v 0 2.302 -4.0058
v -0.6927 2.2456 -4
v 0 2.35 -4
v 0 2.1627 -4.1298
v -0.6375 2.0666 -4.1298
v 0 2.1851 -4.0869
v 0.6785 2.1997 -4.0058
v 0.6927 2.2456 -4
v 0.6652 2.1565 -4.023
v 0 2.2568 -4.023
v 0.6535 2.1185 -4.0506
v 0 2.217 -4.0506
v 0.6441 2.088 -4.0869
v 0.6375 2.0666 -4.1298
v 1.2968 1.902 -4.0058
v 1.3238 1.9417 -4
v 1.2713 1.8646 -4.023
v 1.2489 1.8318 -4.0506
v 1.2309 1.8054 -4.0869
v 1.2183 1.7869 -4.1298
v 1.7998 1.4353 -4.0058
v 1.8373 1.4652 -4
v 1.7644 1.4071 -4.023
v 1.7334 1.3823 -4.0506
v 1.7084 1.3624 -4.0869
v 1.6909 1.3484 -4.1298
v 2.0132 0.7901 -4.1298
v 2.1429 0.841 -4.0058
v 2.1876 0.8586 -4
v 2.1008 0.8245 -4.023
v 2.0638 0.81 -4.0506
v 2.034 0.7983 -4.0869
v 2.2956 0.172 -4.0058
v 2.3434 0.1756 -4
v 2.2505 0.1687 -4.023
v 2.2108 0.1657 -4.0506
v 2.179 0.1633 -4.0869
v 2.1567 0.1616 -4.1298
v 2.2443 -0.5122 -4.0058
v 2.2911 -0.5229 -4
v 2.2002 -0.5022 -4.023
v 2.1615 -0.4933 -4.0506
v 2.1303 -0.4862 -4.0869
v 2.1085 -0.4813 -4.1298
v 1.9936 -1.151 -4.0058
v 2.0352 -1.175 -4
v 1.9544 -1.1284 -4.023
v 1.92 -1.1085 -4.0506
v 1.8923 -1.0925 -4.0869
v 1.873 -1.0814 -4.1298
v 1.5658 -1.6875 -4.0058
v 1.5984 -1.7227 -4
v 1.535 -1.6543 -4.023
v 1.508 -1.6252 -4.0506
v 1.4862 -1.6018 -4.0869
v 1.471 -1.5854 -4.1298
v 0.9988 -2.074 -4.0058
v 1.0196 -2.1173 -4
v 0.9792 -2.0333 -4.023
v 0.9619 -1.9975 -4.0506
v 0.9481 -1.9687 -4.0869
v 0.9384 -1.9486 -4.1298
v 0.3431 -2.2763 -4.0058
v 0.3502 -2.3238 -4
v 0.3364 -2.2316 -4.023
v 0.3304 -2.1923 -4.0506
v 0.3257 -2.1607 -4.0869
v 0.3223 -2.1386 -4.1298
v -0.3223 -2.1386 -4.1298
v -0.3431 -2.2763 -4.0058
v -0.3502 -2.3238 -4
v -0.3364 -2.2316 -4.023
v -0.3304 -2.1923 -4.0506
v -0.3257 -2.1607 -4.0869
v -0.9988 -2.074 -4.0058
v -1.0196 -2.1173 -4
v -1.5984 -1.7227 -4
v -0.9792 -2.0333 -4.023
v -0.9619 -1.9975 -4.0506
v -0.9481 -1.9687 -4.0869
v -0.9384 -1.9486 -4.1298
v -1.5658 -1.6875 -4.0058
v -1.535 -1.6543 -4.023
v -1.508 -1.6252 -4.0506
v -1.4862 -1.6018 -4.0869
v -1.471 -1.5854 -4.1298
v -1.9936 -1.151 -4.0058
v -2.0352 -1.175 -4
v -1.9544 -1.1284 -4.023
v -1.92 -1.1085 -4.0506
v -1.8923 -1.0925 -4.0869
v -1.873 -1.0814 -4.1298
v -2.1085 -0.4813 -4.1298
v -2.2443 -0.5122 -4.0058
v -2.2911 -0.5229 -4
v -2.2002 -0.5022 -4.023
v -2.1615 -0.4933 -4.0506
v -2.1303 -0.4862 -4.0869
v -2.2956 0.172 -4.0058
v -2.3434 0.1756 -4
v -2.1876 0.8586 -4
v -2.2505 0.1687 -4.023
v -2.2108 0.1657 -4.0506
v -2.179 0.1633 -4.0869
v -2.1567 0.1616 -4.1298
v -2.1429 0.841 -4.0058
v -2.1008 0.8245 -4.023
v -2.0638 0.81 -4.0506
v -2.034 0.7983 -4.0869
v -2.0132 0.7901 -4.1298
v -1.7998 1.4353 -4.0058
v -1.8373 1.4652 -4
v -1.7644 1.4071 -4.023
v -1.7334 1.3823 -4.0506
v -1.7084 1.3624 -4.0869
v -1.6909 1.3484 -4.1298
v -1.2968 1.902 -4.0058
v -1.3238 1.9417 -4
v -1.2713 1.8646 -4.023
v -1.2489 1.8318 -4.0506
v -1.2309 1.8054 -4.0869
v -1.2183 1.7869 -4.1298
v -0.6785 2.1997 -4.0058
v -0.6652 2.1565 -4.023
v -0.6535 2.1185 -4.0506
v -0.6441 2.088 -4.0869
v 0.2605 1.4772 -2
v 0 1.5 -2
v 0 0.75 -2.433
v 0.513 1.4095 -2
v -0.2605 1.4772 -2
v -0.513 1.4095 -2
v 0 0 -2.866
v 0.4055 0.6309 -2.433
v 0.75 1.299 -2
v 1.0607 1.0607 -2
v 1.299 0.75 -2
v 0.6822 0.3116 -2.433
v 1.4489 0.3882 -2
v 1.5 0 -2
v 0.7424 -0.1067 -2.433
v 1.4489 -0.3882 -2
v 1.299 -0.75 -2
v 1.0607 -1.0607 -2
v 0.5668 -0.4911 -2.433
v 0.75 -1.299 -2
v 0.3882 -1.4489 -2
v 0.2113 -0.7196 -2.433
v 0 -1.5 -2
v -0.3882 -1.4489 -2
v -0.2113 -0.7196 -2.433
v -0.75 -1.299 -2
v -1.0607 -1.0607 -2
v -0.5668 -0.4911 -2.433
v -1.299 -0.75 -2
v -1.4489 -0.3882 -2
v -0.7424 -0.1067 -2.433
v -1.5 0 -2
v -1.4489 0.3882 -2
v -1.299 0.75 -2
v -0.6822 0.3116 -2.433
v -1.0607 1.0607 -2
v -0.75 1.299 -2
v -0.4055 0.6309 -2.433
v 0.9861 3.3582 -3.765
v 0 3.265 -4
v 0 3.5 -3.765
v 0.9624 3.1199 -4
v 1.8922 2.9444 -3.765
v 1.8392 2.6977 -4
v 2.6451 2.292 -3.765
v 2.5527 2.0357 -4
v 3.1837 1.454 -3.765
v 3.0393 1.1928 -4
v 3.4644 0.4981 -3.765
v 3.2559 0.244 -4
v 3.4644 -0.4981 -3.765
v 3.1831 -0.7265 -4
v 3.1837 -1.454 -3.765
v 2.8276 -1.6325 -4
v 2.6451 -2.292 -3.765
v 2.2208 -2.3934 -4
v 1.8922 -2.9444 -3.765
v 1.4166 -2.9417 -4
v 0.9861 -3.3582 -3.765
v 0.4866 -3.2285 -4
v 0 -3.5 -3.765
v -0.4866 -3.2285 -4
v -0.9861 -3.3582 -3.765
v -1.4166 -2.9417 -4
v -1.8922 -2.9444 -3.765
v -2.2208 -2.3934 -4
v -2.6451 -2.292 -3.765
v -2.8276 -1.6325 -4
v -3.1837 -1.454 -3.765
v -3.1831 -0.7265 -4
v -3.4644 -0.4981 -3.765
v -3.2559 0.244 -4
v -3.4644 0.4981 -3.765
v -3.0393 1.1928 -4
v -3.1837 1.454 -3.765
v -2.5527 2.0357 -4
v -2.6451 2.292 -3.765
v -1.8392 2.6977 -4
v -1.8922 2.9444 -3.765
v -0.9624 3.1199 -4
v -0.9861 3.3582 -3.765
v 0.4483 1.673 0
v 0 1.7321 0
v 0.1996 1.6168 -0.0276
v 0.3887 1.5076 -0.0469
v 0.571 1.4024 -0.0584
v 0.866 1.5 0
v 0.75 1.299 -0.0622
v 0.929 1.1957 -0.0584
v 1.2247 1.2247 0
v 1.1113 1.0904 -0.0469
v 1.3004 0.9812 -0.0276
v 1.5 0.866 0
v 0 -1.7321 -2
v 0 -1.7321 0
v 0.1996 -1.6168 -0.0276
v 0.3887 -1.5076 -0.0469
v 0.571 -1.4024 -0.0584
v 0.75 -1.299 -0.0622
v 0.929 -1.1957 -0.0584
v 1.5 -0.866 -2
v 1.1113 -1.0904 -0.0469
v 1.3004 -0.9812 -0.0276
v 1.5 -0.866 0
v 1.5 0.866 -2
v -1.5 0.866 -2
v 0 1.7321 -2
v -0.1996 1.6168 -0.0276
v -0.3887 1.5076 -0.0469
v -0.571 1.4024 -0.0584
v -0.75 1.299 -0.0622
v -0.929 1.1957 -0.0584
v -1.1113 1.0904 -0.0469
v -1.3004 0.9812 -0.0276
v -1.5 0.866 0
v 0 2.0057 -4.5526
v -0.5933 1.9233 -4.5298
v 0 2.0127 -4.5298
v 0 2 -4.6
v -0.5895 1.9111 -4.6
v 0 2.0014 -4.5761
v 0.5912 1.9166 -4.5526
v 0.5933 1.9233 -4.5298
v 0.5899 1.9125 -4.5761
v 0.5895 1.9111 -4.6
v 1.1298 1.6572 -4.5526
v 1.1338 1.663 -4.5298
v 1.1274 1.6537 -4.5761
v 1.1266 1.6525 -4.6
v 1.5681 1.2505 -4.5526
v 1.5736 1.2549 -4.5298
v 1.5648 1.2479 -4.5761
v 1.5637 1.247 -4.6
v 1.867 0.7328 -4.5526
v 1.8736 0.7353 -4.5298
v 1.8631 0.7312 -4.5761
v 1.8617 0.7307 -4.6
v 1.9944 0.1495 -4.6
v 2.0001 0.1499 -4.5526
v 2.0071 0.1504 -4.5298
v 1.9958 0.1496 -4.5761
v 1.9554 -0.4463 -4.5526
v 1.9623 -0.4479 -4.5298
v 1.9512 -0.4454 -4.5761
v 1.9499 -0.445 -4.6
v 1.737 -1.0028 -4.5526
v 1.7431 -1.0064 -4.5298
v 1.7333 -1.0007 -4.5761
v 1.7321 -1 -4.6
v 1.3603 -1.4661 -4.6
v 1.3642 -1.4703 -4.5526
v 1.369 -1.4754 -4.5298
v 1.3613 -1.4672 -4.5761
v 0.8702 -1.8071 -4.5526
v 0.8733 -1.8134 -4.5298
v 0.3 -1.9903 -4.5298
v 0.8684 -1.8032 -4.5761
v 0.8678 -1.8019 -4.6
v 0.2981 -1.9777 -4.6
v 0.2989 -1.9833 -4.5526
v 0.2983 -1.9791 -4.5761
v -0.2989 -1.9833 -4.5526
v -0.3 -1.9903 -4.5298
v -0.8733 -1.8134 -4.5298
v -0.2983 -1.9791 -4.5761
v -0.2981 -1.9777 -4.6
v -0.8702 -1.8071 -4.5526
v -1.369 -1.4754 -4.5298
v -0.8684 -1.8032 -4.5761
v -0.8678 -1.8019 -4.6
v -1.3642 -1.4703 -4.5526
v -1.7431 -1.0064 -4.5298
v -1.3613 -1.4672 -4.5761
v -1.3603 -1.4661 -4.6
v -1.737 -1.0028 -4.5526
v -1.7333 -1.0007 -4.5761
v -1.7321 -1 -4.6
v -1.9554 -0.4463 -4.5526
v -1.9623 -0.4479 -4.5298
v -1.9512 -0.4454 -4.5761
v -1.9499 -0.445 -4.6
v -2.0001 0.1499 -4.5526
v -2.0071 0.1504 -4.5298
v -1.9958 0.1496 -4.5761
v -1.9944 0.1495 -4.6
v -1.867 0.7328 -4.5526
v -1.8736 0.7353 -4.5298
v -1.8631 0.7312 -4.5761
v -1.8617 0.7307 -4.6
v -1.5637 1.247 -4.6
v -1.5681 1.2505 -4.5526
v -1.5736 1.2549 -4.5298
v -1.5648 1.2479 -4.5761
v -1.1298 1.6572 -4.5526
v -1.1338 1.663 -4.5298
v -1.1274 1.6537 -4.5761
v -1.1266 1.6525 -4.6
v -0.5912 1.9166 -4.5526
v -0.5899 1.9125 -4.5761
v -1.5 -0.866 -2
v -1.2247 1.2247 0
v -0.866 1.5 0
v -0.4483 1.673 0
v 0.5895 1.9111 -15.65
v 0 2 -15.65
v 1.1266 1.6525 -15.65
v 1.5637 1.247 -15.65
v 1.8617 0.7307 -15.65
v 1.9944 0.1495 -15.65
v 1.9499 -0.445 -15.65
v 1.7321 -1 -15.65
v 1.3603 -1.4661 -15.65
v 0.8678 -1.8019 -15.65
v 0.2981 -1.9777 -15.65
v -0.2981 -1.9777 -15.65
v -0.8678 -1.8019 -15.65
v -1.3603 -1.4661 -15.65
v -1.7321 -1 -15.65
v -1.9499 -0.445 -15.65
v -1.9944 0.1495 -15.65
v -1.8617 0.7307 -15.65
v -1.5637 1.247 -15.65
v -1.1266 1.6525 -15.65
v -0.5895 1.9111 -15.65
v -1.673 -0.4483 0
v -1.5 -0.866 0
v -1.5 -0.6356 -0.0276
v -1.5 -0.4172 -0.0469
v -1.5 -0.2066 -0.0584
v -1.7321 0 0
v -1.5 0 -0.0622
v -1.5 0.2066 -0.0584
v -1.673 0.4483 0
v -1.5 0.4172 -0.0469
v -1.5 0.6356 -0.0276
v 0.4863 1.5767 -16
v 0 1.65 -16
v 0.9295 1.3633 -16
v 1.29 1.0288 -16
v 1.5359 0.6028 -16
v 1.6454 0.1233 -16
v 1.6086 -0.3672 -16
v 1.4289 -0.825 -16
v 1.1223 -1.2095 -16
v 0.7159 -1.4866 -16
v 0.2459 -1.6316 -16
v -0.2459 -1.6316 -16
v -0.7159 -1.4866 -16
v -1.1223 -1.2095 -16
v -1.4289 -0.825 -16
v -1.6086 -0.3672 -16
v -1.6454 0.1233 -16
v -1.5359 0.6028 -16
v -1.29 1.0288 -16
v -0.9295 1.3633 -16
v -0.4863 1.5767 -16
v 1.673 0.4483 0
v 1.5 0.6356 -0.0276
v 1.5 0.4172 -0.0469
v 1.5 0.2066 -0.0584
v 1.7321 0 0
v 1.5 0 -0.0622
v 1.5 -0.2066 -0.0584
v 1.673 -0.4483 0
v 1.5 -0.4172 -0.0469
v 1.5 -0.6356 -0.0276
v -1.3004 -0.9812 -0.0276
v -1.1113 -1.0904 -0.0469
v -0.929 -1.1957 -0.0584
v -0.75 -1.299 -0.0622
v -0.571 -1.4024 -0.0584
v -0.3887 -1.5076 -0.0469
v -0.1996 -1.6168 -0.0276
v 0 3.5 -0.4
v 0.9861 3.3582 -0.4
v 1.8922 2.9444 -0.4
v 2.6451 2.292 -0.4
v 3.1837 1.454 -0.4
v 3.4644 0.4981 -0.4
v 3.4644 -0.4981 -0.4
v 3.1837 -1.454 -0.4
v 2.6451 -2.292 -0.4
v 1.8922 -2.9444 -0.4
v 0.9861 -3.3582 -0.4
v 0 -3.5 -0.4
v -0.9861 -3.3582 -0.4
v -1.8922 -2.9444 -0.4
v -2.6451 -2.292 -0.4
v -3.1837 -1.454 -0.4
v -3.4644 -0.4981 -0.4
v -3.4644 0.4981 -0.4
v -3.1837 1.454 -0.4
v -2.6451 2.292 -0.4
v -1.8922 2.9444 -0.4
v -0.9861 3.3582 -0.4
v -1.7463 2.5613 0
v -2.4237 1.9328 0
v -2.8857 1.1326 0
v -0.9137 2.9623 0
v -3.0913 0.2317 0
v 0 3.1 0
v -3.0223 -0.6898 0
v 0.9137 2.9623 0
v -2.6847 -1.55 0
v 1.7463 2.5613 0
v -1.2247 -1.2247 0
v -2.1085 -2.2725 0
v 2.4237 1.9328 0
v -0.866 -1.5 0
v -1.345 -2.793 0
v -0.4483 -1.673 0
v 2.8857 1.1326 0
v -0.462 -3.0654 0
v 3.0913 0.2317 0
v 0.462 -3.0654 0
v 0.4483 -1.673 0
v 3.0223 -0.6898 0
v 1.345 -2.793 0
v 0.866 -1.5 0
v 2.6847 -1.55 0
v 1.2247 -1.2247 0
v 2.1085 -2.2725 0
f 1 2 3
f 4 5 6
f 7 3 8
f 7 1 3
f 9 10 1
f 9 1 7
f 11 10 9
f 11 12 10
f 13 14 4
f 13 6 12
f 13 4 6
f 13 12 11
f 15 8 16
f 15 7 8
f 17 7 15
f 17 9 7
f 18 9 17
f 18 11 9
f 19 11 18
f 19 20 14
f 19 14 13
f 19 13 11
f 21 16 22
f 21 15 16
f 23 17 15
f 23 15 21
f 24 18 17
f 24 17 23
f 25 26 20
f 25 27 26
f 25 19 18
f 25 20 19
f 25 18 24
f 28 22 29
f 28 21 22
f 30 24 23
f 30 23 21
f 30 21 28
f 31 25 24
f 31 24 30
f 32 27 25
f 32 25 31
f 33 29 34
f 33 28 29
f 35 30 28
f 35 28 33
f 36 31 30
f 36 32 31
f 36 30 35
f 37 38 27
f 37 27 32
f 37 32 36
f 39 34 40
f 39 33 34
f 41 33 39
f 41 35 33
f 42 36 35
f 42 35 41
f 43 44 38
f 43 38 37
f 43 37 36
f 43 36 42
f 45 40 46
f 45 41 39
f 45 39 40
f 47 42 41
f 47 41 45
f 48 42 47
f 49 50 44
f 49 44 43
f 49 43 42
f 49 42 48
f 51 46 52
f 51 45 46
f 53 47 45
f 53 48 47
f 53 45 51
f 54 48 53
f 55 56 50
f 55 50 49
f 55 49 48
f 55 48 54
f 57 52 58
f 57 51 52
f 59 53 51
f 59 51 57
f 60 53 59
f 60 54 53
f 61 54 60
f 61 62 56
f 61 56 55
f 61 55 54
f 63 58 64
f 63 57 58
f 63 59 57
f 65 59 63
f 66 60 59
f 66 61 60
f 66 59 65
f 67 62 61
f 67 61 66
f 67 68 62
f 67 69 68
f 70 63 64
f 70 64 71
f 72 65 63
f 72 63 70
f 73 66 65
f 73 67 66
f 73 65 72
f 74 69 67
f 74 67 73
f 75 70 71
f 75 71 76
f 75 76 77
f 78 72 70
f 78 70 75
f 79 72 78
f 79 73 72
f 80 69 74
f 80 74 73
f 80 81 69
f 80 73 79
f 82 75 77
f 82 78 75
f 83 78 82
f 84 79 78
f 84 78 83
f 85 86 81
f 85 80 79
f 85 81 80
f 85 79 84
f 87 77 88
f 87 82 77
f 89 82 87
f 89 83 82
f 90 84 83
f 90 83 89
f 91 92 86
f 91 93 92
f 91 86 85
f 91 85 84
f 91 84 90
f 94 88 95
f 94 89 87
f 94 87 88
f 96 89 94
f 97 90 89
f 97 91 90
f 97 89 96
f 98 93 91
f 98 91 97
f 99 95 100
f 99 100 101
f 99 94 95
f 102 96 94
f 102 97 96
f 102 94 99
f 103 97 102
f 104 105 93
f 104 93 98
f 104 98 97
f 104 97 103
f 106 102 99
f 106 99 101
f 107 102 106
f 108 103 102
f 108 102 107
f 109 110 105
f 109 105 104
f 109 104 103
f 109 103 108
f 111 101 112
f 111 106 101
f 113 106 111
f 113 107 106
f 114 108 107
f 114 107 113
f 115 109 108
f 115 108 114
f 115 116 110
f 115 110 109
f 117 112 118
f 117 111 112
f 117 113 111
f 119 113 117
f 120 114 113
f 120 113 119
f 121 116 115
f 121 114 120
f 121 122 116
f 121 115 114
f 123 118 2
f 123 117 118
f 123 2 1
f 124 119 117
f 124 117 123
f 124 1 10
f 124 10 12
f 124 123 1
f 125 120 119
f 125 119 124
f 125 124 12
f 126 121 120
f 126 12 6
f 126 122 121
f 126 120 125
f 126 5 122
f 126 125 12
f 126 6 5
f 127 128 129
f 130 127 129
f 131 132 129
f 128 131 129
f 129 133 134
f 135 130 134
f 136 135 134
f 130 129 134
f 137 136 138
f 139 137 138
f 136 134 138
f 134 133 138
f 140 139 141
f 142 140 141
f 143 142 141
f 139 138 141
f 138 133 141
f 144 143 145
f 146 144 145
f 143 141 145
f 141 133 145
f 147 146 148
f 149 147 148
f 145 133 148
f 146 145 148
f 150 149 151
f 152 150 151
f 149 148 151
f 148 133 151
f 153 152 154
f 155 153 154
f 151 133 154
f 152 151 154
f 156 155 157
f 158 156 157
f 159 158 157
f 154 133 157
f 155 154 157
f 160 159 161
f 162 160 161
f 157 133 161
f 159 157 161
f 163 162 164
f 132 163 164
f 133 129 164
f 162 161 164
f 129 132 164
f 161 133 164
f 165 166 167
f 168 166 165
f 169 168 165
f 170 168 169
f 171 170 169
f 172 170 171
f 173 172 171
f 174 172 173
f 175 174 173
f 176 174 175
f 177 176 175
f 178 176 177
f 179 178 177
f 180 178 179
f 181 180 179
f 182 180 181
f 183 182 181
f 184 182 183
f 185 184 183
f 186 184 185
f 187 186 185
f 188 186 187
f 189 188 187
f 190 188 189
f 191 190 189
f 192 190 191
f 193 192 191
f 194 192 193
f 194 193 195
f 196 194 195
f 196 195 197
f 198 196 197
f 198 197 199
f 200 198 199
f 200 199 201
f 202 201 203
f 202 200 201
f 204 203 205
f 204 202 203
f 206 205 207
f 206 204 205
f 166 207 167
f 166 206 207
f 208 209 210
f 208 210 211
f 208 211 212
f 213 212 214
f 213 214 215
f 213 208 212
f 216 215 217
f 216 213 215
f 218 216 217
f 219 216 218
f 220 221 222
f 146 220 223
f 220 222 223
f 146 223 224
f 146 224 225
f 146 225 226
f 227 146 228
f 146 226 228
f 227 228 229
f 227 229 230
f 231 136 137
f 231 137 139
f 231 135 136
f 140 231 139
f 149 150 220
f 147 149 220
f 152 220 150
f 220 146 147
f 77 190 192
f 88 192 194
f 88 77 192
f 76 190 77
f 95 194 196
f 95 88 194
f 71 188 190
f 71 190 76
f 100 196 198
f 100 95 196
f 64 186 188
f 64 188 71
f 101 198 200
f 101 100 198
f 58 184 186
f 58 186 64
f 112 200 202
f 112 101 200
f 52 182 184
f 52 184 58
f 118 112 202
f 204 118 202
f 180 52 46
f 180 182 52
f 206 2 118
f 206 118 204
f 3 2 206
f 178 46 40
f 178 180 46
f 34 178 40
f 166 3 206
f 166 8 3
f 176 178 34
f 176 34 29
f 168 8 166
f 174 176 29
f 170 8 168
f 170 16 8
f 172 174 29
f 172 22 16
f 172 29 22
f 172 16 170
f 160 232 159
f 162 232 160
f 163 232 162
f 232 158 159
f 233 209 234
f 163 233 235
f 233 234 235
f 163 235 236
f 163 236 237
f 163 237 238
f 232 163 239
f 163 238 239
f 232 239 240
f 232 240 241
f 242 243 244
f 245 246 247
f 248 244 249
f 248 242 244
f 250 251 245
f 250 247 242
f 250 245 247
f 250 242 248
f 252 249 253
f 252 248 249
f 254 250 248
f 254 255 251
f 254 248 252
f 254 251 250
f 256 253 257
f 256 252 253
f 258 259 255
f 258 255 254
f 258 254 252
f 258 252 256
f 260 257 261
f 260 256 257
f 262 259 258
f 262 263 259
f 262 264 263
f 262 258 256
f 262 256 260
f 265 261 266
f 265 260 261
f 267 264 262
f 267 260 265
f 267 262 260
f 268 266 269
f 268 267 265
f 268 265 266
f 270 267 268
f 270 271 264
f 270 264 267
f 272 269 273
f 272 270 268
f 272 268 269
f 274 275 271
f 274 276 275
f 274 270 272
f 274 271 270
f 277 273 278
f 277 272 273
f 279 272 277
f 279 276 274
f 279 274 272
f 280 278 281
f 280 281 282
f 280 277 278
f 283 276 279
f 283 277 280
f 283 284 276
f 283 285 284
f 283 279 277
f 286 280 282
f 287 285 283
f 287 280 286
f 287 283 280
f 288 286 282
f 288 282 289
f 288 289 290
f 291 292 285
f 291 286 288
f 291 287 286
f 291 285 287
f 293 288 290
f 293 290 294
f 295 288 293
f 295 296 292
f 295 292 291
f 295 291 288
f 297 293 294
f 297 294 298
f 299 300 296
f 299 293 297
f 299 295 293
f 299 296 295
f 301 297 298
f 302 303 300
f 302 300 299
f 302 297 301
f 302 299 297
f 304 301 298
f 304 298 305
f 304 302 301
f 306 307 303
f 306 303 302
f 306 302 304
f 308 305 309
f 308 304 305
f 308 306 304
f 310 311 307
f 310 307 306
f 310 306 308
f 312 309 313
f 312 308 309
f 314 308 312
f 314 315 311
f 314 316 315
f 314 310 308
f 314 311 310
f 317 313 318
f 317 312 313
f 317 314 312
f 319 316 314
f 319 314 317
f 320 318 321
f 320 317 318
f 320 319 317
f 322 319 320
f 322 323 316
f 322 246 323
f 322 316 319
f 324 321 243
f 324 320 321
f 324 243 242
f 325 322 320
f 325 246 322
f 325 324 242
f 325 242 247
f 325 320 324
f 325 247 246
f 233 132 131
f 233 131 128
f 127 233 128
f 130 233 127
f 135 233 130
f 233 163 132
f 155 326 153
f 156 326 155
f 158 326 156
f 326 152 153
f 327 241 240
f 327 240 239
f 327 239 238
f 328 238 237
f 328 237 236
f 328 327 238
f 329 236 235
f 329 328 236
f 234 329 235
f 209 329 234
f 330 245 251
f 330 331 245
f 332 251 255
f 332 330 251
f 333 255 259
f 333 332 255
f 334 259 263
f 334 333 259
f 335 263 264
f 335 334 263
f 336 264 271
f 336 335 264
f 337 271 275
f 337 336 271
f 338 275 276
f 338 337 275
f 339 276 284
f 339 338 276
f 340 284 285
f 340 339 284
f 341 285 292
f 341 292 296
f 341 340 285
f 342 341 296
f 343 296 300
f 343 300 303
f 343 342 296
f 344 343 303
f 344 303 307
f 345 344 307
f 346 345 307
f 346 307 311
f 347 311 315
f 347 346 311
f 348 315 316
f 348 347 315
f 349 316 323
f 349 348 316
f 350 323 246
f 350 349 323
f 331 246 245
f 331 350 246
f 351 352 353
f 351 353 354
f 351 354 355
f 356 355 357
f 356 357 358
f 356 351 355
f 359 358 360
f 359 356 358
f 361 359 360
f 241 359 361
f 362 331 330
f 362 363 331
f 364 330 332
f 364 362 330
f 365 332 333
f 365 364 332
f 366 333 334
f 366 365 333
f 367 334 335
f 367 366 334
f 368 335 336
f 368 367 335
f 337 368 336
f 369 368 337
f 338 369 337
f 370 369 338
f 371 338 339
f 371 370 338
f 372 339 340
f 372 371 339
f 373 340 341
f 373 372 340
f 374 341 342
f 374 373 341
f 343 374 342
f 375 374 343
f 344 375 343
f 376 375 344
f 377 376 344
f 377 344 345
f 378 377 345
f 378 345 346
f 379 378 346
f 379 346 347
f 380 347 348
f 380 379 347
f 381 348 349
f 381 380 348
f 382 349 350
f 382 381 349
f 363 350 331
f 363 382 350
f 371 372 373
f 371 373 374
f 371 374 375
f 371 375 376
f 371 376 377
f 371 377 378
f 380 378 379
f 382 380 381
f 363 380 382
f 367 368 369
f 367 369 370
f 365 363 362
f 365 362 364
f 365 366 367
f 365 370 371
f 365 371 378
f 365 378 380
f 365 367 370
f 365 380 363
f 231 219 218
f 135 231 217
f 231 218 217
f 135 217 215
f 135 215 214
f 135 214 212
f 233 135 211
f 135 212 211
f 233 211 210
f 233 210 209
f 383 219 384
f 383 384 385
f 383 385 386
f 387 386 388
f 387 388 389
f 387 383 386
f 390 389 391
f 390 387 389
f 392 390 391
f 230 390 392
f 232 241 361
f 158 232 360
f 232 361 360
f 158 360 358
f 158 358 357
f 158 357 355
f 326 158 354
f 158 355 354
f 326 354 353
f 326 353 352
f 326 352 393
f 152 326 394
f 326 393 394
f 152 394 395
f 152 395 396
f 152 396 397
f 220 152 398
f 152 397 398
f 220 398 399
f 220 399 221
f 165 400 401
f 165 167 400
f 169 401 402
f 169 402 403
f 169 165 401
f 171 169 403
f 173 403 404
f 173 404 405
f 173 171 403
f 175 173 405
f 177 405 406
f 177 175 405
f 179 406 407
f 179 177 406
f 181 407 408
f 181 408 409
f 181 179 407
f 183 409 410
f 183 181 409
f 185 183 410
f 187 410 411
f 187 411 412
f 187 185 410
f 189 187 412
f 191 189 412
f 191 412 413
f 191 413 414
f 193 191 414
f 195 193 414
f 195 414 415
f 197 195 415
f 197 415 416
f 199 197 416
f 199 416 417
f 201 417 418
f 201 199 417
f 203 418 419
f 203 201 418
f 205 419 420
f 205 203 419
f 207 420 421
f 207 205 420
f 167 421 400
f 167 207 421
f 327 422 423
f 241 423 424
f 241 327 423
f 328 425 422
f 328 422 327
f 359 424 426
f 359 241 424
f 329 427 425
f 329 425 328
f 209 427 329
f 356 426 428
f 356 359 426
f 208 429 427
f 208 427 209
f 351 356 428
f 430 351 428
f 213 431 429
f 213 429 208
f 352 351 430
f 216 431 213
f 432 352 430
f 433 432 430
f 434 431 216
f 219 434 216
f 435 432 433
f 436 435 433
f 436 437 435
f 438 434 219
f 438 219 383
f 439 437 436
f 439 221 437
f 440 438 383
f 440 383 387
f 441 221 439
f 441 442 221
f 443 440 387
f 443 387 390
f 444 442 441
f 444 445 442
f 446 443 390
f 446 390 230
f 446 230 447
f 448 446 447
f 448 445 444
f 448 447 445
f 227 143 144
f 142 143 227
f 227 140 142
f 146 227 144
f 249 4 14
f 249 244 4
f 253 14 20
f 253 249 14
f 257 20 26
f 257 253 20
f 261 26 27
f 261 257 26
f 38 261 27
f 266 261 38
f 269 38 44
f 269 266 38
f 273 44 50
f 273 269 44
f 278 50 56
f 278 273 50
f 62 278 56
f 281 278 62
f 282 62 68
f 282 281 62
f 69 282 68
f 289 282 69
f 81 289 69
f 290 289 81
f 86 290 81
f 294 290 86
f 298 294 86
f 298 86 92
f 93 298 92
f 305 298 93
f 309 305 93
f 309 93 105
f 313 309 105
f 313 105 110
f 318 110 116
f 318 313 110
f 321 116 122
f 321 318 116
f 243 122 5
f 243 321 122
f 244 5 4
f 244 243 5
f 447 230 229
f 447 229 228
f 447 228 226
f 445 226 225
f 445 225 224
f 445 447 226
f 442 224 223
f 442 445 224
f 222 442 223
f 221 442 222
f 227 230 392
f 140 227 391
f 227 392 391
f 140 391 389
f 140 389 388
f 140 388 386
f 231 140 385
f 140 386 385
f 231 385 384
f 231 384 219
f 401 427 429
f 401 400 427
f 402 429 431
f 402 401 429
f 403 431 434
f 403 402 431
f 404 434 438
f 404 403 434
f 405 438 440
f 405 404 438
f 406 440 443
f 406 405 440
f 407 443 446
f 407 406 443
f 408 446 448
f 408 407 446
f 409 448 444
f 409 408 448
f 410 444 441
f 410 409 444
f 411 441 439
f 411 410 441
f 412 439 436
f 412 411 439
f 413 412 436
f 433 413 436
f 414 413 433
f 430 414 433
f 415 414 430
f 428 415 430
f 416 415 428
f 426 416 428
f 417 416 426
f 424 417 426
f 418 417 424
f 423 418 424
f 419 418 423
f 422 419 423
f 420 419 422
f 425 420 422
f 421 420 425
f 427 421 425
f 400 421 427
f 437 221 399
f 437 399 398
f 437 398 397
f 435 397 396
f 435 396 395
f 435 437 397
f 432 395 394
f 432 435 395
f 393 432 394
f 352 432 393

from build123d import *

# Parameters (mm, degrees)
CUT_EXTRUDE1_DEPTH = 2


with BuildPart() as part:
    # Sketch1 → Revolve1 (revolve)
    with BuildSketch(Plane(origin=(0, 0, 0), x_dir=(0, 0, -1), z_dir=(1, 0, 0))):
        with BuildLine():
            Line((0, 0), (0, 3.1))
            Line((0, 3.1), (0.4, 3.5))
            Line((0.4, 3.5), (3.765, 3.5))
            Line((3.765, 3.5), (4, 3.265))
            Line((4, 3.265), (4, 2.35))
            ThreePointArc((4, 2.35), (4.035614876, 2.236081032), (4.129775312, 2.162734164))
            Line((4.129775312, 2.162734164), (4.529775312, 2.012734164))
            ThreePointArc((4.529775312, 2.012734164), (4.564315039, 2.00320929), (4.6, 2))
            Line((4.6, 2), (15.65, 2))
            Line((15.65, 2), (16, 1.65))
            Line((16, 1.65), (16, 0))
            Line((16, 0), (0, 0))
        make_face()
    revolve(axis=Axis((0, 0, 0), (0, 0, -1)))

    # Sketch2 → Cut-Extrude1 (cut)
    with BuildSketch(Plane.XY):
        Polygon((0, 1.732050808), (-1.5, 0.866025404), (-1.5, -0.866025404), (0, -1.732050808), (1.5, -0.866025404), (1.5, 0.866025404), align=None)
    extrude(amount=-CUT_EXTRUDE1_DEPTH, mode=Mode.SUBTRACT)

    # Sketch3 → Cut-Revolve2 (revolve, cut)
    with BuildSketch(Plane(origin=(0, 0, 0), x_dir=(0, 0, -1), z_dir=(1, 0, 0))):
        Polygon((2, 0), (2, 1.5), (2.866025404, 0), align=None)
    revolve(axis=Axis((0, 0, -2), (0, 0, -1)), mode=Mode.SUBTRACT)

    # Sketch4 → Cut-Revolve3 (revolve, cut)
    with BuildSketch(Plane(origin=(0, 0, 0), x_dir=(0, 0, -1), z_dir=(1, 0, 0))):
        Polygon((0, 1.732050808), (0, 1.5), (0.062177826, 1.5), align=None)
    revolve(axis=Axis((0, 0, 0), (0, 0, -1)), mode=Mode.SUBTRACT)


solid = part.part
